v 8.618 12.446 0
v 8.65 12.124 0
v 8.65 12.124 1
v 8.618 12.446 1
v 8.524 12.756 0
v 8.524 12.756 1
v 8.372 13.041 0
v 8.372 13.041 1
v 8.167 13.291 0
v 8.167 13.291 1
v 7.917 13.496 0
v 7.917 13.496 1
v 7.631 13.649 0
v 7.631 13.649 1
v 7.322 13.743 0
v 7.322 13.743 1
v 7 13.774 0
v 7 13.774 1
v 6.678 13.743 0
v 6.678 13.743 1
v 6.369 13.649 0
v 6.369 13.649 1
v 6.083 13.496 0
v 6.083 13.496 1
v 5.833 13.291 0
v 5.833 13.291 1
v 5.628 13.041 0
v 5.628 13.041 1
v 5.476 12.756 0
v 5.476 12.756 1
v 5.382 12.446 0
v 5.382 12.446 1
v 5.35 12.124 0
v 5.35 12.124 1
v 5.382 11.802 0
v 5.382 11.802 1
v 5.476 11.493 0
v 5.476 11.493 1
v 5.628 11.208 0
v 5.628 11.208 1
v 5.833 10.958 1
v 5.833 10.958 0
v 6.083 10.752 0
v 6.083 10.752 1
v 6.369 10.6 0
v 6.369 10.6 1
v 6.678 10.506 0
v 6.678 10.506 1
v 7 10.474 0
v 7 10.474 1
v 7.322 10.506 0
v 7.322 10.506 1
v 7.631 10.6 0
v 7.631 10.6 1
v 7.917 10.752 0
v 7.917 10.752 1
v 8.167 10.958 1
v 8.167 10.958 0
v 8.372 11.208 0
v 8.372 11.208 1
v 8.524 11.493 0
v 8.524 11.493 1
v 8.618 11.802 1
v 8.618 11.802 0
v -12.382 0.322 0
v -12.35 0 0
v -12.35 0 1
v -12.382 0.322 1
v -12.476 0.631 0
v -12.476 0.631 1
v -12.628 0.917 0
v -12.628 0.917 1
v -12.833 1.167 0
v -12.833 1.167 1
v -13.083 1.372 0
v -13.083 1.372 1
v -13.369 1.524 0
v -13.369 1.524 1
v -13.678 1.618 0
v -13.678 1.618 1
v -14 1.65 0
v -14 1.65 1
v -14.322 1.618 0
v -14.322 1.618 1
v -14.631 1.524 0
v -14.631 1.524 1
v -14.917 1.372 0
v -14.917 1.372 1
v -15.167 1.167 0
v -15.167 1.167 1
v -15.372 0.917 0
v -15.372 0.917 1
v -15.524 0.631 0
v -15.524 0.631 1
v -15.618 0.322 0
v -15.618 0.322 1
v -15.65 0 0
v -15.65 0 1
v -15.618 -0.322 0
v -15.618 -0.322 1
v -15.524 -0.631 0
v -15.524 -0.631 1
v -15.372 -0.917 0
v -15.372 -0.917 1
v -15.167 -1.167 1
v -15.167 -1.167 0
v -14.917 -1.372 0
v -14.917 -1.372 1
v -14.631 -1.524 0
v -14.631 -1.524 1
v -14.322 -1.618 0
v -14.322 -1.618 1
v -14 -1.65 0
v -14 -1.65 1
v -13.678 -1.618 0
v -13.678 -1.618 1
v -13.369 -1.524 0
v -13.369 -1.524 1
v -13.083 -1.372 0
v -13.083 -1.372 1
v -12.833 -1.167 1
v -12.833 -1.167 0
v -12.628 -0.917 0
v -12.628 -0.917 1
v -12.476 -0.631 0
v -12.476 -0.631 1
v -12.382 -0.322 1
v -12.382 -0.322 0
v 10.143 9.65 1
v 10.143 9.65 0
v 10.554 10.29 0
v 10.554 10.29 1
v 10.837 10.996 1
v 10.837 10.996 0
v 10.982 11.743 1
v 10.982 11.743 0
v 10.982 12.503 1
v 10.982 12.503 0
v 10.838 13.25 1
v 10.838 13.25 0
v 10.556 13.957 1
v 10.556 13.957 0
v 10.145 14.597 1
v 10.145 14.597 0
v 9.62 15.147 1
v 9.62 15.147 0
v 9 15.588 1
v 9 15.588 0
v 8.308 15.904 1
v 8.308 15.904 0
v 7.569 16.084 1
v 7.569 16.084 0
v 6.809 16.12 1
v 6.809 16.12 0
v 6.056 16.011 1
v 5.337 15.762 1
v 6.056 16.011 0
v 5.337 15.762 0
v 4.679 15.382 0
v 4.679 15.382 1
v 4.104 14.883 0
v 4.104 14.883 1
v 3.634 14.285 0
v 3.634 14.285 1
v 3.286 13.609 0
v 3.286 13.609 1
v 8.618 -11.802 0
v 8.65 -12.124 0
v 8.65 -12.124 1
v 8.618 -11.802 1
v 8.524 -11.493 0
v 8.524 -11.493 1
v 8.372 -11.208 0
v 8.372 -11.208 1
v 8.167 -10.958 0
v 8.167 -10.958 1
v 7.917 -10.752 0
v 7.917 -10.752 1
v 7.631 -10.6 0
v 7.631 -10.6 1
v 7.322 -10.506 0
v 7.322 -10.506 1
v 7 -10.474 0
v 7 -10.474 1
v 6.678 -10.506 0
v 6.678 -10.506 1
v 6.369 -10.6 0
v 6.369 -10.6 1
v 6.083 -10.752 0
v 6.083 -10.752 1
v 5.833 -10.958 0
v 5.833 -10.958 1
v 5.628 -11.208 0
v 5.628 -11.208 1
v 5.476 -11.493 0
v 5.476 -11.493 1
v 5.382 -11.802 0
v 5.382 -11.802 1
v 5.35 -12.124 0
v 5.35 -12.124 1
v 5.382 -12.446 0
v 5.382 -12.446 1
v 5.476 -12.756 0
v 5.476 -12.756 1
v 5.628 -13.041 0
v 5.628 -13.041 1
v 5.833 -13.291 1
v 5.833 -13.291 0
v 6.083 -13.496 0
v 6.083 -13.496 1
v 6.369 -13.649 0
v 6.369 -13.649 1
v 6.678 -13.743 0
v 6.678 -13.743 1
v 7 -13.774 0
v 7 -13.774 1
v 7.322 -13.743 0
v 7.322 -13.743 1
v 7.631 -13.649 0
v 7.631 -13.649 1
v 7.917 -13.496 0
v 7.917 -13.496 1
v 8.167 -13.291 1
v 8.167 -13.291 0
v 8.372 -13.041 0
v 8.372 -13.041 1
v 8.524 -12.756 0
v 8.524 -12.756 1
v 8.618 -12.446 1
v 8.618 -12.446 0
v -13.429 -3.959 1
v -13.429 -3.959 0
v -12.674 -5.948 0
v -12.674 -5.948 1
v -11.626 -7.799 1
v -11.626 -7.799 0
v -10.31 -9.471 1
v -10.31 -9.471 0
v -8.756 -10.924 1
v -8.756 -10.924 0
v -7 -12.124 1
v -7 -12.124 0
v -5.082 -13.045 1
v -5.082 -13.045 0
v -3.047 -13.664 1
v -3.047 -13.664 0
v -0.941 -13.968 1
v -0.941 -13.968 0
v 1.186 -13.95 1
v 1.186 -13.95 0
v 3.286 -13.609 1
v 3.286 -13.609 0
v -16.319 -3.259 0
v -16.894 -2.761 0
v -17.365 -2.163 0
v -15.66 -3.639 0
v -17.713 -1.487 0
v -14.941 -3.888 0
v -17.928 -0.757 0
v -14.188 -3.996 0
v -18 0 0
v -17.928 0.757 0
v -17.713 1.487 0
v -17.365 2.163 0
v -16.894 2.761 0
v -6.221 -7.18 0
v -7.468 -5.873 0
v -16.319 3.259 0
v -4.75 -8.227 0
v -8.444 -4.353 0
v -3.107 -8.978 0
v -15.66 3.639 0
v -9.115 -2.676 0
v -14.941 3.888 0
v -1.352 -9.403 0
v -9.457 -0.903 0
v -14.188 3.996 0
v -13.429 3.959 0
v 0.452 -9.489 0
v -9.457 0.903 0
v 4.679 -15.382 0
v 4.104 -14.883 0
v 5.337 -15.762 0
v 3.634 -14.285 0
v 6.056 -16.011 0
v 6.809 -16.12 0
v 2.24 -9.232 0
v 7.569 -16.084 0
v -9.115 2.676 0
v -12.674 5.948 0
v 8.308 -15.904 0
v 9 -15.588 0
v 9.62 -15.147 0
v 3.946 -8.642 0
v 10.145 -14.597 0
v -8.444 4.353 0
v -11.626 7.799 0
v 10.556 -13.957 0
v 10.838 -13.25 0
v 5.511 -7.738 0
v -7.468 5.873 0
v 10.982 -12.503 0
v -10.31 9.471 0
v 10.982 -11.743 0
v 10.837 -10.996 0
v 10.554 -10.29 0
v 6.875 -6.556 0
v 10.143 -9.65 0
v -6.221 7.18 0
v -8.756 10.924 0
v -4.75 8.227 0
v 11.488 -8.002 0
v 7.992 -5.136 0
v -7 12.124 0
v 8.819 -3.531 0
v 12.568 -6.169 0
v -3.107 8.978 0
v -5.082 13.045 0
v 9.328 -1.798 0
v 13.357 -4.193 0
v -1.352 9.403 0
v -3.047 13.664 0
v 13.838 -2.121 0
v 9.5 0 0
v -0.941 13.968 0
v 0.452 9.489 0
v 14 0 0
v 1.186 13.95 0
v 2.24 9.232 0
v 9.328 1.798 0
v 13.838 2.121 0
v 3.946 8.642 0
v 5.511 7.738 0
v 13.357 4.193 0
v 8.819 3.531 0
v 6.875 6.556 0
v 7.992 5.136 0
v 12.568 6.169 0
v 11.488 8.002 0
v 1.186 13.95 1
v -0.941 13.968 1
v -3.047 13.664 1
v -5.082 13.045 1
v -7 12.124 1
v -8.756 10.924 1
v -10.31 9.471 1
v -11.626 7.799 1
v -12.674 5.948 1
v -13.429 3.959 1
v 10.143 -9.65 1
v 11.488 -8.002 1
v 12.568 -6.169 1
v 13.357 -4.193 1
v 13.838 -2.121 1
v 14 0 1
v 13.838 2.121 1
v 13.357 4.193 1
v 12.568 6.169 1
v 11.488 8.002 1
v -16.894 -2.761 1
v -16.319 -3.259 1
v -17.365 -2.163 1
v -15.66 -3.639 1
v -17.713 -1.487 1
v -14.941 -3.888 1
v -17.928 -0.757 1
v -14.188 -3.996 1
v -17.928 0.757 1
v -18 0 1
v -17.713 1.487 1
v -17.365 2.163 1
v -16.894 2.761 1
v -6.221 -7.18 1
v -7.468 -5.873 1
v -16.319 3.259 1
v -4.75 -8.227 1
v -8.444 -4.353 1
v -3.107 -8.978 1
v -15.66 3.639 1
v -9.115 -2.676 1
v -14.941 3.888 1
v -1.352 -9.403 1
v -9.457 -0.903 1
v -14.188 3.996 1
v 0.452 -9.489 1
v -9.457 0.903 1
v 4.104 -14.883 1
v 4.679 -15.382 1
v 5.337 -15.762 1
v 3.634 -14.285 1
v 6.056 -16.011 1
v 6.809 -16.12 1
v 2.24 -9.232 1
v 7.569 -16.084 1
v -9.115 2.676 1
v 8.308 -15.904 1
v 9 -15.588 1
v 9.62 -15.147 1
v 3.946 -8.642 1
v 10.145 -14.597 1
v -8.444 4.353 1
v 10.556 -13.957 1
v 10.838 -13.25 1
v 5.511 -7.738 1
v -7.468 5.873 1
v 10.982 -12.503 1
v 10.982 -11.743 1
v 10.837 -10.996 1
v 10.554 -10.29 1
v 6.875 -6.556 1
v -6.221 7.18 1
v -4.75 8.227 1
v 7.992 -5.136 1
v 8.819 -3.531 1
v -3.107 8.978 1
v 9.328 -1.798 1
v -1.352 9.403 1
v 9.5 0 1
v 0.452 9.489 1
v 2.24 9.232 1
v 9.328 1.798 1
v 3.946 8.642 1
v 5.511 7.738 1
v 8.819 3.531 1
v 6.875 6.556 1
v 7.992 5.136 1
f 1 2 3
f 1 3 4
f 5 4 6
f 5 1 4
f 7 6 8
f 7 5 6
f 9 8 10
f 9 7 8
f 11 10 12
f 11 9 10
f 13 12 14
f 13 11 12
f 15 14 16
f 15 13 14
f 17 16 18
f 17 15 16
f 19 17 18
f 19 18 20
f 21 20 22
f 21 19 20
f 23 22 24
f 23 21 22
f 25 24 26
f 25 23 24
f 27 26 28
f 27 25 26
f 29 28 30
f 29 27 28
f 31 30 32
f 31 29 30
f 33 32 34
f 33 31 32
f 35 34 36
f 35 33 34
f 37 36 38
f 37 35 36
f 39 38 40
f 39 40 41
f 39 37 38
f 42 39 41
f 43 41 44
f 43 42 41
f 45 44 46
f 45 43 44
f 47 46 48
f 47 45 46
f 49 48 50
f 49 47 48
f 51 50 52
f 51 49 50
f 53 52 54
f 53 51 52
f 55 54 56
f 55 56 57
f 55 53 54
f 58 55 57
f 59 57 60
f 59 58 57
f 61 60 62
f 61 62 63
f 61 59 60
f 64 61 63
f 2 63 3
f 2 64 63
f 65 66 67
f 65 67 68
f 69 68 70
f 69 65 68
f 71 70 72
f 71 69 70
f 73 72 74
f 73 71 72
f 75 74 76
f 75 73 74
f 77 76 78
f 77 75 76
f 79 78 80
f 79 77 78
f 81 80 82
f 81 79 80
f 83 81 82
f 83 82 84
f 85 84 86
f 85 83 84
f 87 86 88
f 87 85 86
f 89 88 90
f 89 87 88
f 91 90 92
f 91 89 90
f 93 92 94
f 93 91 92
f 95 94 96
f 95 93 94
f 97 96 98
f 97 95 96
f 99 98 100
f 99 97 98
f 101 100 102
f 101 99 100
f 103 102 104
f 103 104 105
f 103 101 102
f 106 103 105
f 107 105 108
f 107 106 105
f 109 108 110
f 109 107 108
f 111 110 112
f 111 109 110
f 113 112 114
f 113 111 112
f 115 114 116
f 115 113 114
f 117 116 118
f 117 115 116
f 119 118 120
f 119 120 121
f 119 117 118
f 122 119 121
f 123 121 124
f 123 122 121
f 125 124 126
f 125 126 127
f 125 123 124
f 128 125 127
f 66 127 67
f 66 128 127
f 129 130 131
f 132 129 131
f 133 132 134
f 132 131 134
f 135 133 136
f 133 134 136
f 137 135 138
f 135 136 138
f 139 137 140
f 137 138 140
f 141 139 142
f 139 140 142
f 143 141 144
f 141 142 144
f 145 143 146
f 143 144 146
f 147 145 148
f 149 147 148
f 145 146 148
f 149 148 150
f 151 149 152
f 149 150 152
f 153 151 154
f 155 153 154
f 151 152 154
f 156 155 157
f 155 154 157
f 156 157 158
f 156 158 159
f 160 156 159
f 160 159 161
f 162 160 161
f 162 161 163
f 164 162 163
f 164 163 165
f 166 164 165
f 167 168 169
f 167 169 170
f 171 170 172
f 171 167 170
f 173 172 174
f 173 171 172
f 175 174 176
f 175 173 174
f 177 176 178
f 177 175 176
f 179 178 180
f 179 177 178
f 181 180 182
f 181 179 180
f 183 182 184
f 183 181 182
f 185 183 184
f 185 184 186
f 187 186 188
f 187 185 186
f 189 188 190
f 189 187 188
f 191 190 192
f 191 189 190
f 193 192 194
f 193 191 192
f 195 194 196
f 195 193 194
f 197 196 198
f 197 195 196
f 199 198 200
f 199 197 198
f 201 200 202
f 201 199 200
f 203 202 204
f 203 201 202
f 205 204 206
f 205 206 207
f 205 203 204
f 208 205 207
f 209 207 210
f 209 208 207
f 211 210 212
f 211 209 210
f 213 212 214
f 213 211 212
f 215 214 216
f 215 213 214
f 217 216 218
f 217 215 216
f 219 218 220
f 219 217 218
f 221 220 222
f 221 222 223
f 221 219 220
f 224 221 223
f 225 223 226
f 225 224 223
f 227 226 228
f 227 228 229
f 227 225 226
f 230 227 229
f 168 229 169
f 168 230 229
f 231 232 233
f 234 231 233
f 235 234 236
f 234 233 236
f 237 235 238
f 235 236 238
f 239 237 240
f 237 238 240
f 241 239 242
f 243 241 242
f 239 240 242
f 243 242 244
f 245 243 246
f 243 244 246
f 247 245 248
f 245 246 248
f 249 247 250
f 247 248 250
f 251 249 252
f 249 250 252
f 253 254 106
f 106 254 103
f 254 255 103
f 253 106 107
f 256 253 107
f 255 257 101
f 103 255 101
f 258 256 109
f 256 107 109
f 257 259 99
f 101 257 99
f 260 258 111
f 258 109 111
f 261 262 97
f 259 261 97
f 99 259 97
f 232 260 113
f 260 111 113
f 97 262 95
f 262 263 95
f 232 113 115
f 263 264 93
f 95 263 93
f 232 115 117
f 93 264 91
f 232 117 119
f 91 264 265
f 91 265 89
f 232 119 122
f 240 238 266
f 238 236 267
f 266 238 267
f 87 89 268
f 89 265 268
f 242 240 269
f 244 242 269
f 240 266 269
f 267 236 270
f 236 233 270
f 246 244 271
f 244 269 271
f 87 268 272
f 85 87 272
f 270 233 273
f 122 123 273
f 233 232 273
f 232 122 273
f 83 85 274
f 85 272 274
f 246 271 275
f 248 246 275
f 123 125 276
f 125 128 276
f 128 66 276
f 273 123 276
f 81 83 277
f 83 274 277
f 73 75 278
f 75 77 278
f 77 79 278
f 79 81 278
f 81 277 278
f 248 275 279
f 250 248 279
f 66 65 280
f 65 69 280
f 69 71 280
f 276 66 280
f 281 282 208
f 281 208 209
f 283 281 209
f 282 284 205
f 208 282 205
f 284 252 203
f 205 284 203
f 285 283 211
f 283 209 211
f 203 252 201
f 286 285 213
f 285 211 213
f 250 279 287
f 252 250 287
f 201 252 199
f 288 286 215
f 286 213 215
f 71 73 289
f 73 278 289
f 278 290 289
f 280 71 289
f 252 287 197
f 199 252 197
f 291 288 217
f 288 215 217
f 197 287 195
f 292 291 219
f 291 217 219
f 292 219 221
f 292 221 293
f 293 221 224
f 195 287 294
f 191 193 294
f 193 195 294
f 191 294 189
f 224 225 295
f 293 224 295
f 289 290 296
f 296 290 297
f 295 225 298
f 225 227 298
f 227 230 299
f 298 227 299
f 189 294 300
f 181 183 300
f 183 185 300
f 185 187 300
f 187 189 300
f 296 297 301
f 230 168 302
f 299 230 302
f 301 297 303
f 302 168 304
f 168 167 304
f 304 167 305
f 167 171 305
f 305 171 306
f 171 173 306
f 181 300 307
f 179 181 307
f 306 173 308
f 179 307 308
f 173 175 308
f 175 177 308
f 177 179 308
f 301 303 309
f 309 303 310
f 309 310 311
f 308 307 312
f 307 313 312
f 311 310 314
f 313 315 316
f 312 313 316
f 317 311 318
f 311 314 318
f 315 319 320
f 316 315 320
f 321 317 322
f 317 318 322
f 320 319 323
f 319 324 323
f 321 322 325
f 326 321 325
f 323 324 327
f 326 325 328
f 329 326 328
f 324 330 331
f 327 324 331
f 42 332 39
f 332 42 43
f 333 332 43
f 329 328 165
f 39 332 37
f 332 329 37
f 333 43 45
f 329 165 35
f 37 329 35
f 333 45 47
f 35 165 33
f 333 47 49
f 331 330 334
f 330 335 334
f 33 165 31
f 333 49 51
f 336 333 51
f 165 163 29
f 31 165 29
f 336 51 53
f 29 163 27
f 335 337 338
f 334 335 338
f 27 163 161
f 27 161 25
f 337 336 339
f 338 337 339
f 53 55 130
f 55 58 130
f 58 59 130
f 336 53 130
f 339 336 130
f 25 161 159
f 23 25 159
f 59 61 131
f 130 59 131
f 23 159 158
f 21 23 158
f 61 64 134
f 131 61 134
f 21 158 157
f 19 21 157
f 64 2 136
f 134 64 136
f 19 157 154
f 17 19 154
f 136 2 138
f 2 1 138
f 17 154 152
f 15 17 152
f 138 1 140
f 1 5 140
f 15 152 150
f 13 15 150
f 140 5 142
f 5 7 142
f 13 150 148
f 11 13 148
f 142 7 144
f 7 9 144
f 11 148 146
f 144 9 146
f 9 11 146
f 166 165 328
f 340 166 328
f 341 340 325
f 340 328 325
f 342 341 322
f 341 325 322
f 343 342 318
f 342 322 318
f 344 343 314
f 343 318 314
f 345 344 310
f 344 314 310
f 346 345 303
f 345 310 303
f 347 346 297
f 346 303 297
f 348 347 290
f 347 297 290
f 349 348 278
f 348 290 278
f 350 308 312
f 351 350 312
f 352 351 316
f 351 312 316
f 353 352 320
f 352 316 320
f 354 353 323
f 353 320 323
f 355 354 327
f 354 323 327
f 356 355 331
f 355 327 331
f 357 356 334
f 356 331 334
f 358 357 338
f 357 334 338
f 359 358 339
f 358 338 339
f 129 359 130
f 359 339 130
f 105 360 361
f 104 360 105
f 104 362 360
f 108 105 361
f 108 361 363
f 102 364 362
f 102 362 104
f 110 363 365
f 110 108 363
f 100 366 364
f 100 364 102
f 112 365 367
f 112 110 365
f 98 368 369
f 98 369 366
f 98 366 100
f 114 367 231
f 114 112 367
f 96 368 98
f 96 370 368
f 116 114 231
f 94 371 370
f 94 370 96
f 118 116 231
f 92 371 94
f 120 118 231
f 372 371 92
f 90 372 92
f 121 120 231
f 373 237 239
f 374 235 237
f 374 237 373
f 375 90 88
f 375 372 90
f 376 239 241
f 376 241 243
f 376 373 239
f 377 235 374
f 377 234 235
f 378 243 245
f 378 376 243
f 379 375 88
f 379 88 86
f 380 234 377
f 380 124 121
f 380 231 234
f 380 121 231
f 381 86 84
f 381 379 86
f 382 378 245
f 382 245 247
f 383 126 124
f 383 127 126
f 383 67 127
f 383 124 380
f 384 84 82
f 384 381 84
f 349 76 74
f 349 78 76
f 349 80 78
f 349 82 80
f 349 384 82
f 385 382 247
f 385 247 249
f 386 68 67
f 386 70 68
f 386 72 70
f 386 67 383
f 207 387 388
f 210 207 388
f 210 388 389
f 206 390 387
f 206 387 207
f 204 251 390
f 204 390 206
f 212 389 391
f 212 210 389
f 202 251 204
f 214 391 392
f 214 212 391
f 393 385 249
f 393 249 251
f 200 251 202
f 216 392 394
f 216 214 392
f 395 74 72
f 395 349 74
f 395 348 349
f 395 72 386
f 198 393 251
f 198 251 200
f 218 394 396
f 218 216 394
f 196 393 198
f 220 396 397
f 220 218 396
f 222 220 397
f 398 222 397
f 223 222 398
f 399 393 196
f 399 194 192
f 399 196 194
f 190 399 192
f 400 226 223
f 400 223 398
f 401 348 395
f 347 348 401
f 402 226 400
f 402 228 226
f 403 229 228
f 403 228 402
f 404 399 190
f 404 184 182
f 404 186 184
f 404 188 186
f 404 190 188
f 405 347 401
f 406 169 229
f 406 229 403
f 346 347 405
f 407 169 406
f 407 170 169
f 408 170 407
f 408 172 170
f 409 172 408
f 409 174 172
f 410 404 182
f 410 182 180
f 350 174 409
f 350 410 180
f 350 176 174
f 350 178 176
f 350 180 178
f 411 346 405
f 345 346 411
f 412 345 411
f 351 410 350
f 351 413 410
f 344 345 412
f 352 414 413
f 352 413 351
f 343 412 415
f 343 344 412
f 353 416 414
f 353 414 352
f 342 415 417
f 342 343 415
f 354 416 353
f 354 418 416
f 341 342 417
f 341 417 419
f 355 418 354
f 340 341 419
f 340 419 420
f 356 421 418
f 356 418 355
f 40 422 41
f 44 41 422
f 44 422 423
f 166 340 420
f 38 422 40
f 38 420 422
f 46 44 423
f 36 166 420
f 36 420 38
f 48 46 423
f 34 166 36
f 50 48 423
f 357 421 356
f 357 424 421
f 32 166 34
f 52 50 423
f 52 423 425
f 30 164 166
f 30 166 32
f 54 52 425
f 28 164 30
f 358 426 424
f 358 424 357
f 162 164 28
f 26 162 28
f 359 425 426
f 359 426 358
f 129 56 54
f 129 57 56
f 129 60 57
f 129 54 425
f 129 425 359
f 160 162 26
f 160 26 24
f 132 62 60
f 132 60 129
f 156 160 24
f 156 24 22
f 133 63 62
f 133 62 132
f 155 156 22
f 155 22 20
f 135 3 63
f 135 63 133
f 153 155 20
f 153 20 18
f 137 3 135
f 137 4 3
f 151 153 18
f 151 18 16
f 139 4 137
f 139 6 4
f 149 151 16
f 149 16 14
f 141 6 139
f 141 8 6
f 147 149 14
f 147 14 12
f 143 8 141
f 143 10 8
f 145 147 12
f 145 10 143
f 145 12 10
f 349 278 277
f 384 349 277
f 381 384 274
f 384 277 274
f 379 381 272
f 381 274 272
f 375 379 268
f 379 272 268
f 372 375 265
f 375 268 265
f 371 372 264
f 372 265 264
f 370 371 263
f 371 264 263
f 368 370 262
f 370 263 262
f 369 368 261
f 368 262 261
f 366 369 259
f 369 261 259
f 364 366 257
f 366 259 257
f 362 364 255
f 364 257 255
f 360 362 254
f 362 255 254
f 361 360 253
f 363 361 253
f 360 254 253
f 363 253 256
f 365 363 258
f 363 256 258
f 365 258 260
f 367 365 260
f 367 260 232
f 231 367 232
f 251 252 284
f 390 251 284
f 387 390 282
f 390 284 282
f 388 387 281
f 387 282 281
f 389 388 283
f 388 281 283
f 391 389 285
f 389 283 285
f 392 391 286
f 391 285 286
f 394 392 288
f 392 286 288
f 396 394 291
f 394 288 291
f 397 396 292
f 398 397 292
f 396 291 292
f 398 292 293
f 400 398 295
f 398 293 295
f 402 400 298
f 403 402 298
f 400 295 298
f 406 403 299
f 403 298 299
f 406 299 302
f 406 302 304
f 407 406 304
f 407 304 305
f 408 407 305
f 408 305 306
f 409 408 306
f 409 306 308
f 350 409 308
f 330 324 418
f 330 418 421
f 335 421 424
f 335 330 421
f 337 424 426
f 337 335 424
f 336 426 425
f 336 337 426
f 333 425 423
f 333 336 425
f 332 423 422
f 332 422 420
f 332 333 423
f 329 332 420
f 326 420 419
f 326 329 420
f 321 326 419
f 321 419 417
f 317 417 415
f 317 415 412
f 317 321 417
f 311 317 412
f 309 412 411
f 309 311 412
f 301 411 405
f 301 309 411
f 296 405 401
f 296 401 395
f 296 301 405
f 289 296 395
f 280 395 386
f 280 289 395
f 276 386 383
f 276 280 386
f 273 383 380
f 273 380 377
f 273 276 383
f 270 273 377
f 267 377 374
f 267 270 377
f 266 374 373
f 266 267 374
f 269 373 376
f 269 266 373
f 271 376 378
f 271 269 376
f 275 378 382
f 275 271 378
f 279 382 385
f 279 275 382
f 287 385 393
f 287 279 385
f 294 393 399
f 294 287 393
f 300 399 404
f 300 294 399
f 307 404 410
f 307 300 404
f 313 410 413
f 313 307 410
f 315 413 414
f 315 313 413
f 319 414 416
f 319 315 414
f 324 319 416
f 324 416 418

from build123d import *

# Parameters (mm, degrees)
SKETCH1_R           = 1.65
SKETCH1_R_2         = 9.5
BOSS_EXTRUDE1_DEPTH = 1


with BuildPart() as part:
    # Sketch1 → Boss-Extrude1 (new body)
    with BuildSketch(Plane.XY):
        with BuildLine():
            ThreePointArc((10.142857143, 9.649997356), (9, 15.588457268), (3.285714286, 13.608970631))
            ThreePointArc((3.285714286, 13.608970631), (-7, 12.124355653), (-13.428571429, 3.958973274))
            ThreePointArc((-13.428571429, 3.958973274), (-18, 0), (-13.428571429, -3.958973274))
            ThreePointArc((-13.428571429, -3.958973274), (-7, -12.124355653), (3.285714286, -13.608970631))
            ThreePointArc((3.285714286, -13.608970631), (9, -15.588457268), (10.142857143, -9.649997356))
            ThreePointArc((10.142857143, -9.649997356), (14, 0), (10.142857143, 9.649997356))
        make_face()
        with Locations((7, 12.124355653)):
            Circle(SKETCH1_R, mode=Mode.SUBTRACT)
        with Locations((7, -12.124355653)):
            Circle(SKETCH1_R, mode=Mode.SUBTRACT)
        with Locations((-14, 0)):
            Circle(SKETCH1_R, mode=Mode.SUBTRACT)
        Circle(SKETCH1_R_2, mode=Mode.SUBTRACT)
    extrude(amount=BOSS_EXTRUDE1_DEPTH)


solid = part.part
